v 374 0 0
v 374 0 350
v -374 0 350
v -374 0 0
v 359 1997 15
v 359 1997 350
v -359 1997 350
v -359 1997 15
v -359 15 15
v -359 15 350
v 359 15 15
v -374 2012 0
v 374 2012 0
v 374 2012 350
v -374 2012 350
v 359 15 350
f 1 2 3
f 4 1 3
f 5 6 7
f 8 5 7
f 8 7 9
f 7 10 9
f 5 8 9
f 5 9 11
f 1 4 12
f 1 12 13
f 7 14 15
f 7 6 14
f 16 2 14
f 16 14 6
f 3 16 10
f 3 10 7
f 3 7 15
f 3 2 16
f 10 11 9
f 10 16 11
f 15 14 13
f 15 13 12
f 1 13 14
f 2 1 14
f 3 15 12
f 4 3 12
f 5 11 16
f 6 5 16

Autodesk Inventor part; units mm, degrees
ref_plane "YZ Plane" through (0, 0, 0) normal (1, 0, 0) x (0, 1, 0)
ref_plane "XZ Plane" through (0, 0, 0) normal (0, 1, 0) x (-1, 0, 0)
ref_plane "XY Plane" through (0, 0, 0) normal (0, 0, 1) x (1, 0, 0)
sketch "Sketch1" plane through (0, 0, 0) normal (0, 1, 0) x (-1, 0, 0)
  line L0 (374, 0) -> (-374, 0)
  line L1 (-374, 0) -> (-374, 350)
  line L2 (-374, 350) -> (374, 350)
  line L3 (374, 350) -> (374, 0)
  point P0 (0, 0)
  point P1 (0, 0)
  dimension "d0" = 350
  dimension "d1" = 748
extrude "Extrusion1" add sketch "Sketch1" along normal blind 2012
shell "Shell1" thickness 15 removed faces 1 at (-124.6667, 670.6667, 350)
properties part number "PAX"
